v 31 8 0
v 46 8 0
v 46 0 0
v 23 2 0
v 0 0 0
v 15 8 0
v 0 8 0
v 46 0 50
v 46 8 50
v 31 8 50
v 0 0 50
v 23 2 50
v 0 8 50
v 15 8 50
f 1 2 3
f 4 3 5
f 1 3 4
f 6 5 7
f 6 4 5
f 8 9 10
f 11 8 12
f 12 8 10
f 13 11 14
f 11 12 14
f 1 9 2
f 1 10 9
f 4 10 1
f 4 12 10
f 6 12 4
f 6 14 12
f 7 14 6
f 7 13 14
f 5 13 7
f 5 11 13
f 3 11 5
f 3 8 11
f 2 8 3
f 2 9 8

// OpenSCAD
$fn = 32;

// ----------------------------------------------------------------------
// V guide rail: vway, 46 mm wide
// ----------------------------------------------------------------------

// --- parameters (mm) ---
rail_w = 46;              // rail width, X
base_t = 8;               // base plate thickness
v_depth = 6;              // V feature depth / height
v_half_w = 8;             // half width of the V at the base face
plate_t = 50;             // rail length, Z (the extrusion height)
fit_tol = 0.1;            // declared fit tolerance (prompt contract)
free_tol = 0.5;           // declared free tolerance (prompt contract)

profile = [[0, 0], [46, 0], [46, 8], [31, 8], [23, 2], [15, 8], [0, 8]];  // primary outline, 7 points, counter clockwise

// --- the one profile operation ---
linear_extrude(height = plate_t) polygon(points = profile);
